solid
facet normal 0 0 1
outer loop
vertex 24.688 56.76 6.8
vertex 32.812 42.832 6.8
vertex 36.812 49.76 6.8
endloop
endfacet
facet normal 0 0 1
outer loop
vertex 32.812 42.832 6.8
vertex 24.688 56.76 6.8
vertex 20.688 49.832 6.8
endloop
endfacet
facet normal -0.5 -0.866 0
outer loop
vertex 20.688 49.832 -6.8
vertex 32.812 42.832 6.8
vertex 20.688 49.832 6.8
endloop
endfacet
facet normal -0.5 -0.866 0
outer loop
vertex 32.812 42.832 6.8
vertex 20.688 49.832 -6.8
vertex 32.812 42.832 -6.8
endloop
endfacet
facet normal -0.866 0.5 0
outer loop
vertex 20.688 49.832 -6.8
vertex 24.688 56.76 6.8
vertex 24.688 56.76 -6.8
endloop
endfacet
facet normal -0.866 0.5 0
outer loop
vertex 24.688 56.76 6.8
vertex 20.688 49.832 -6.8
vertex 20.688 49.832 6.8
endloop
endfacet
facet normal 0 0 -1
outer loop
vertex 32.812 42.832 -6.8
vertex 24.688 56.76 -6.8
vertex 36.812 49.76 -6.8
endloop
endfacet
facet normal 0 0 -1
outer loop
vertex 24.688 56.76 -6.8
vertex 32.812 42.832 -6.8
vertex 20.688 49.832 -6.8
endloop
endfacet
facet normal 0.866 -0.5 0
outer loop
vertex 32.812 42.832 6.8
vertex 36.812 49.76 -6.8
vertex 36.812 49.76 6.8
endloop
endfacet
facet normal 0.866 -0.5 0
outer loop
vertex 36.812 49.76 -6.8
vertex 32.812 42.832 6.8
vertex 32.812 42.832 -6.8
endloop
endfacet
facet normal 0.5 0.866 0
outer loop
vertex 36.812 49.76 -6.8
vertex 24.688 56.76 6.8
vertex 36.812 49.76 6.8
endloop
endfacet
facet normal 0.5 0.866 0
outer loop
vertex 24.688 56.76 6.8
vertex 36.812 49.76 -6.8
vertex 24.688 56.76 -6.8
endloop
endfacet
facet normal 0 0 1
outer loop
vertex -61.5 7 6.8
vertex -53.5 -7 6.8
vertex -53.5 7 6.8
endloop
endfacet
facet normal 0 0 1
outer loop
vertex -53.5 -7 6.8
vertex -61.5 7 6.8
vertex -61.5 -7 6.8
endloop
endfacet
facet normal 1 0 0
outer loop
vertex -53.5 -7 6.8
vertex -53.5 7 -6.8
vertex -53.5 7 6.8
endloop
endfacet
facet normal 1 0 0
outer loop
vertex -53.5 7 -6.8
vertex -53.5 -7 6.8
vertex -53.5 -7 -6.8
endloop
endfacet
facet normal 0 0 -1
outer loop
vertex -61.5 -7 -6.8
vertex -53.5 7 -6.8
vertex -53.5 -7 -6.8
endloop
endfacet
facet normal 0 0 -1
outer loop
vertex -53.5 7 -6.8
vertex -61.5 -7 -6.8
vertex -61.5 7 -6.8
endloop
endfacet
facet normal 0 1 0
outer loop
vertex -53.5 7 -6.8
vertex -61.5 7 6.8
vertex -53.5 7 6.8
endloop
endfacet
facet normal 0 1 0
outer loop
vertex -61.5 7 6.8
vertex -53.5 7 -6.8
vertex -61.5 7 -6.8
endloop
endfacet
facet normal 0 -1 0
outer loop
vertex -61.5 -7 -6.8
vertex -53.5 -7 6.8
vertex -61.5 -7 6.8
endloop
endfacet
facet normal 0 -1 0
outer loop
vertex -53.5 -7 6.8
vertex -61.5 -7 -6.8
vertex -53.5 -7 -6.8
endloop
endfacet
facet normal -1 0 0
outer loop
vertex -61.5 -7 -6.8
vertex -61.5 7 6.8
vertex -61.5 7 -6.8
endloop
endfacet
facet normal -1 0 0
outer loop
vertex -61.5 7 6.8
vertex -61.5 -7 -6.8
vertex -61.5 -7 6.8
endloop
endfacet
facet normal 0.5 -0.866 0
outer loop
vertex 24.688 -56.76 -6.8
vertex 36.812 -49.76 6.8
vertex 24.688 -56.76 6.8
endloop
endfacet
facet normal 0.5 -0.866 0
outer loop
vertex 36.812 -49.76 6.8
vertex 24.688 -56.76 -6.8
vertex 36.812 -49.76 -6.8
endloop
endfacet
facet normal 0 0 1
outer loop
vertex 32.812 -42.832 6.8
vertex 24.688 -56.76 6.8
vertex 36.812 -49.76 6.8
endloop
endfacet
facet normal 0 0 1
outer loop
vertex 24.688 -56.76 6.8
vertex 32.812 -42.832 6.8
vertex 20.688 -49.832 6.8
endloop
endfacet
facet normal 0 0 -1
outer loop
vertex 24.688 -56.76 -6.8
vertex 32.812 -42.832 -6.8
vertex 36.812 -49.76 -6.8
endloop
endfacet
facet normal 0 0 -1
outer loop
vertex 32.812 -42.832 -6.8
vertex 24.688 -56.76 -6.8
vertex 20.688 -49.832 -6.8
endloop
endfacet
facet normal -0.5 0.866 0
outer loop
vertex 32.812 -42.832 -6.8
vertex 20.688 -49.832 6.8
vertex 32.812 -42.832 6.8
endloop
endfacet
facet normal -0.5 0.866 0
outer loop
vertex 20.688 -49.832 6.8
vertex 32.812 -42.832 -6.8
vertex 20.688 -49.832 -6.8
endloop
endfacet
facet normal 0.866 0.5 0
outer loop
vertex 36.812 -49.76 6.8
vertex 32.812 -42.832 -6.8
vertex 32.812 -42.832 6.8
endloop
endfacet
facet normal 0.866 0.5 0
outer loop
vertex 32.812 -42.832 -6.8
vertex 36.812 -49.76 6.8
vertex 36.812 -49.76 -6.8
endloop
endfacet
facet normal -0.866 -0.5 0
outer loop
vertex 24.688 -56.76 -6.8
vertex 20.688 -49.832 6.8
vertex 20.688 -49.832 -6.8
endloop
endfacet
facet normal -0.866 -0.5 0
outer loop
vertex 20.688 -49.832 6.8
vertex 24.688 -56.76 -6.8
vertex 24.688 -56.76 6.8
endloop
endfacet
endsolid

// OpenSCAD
// ============================================================================
// Atom Lithography Machine — Parametric OpenSCAD Module (S2.5-03)
// ============================================================================
// part_id           : S2.5-03
// parent_bom_id     : S2.5
// subsystem         : S2
// part_name         : Kafa cercevesi referans optik aynasi ve lazer hedef prizmasi
// material          : Zerodur
// temp_stage        : 300 K
// vacuum_grade      : UHV 1e-9 mbar
// tolerance         : ±2 arcsec
// computed_mass_kg  : 0.01153
// envelope_mm       : 98.112 x 113.121 x 13.600
// design_maturity   : M0_M1_DETAILED_CAD_DESIGN_ONLY
// no_lab_measurement: true
// iec61508_certified: false
// semi_s2_certified : false
// Units: millimeters (mm)
// ============================================================================

$fn = 64;

// Nominal bounding envelope parameters (mm)
bbox_x = 98.1122;
bbox_y = 113.1211;
bbox_z = 13.6000;

// Part-specific parametric dimensions
mirror_pcd = 115.0;
mirror_t = 8.0;
mirror_w = 14.0;
mirror_h = 13.6;
flatness_nm = 31.6;

// Interface / port parameters (mm)

module part_S2_5_03() {
  union() {
    // Zerodur λ/20 reference mirror #1 (60 deg)
    translate([28.750, 49.796, 0.000]) rotate([0.000, 0.000, 60.000]) cube([8.000, 14.000, 13.600], center=true);
    // Zerodur λ/20 reference mirror #2 (180 deg)
    translate([-57.500, 0.000, 0.000]) rotate([0.000, 0.000, 180.000]) cube([8.000, 14.000, 13.600], center=true);
    // Zerodur λ/20 reference mirror #3 (300 deg)
    translate([28.750, -49.796, 0.000]) rotate([0.000, 0.000, 300.000]) cube([8.000, 14.000, 13.600], center=true);
  }
}

// World assembly mounting transform (global machine frame, mm / deg):
// translate([0.000, 0.000, 20.000]) rotate([0.000, 0.000, 0.000]) part_S2_5_03();

part_S2_5_03();
